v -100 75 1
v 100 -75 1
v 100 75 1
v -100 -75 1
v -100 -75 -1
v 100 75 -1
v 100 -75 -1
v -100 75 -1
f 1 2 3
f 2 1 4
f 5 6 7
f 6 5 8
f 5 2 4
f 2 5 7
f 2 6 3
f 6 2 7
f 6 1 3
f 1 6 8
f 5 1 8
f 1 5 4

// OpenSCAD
// Parameters
sheet_length = 200; //[100:400:1]
sheet_width = 150; //[75:300:1]
sheet_thickness = 2; //[1:4:0.5]
corner_radius = 0; //[0:20:1]
edge_chamfer = 0; //[0:2:0.25]

// Module for the silicone sheet with optional rounded corners and chamfered edges
module silicone_sheet() {
  color([0.85, 0.85, 0.8]) { // Off-white color for silicone
    // Base sheet
    difference() {
      // Main body
      cube([sheet_length, sheet_width, sheet_thickness], center=true);
      
      // Apply corner rounding if specified
      if (corner_radius > 0) {
        for (x = [-1, 1], y = [-1, 1]) {
          translate([x * (sheet_length/2 - corner_radius), y * (sheet_width/2 - corner_radius), 0])
            cylinder(r=corner_radius, h=sheet_thickness, center=true);
        }
      }
      
      // Apply edge chamfer if specified
      if (edge_chamfer > 0) {
        for (x = [-1, 1], y = [-1, 1]) {
          translate([x * (sheet_length/2 - edge_chamfer), y * (sheet_width/2 - edge_chamfer), 0])
            rotate([90, 0, 0])
            cylinder(r=edge_chamfer, h=sheet_thickness, center=true);
        }
      }
    }
  }
}

// Final output
silicone_sheet();
